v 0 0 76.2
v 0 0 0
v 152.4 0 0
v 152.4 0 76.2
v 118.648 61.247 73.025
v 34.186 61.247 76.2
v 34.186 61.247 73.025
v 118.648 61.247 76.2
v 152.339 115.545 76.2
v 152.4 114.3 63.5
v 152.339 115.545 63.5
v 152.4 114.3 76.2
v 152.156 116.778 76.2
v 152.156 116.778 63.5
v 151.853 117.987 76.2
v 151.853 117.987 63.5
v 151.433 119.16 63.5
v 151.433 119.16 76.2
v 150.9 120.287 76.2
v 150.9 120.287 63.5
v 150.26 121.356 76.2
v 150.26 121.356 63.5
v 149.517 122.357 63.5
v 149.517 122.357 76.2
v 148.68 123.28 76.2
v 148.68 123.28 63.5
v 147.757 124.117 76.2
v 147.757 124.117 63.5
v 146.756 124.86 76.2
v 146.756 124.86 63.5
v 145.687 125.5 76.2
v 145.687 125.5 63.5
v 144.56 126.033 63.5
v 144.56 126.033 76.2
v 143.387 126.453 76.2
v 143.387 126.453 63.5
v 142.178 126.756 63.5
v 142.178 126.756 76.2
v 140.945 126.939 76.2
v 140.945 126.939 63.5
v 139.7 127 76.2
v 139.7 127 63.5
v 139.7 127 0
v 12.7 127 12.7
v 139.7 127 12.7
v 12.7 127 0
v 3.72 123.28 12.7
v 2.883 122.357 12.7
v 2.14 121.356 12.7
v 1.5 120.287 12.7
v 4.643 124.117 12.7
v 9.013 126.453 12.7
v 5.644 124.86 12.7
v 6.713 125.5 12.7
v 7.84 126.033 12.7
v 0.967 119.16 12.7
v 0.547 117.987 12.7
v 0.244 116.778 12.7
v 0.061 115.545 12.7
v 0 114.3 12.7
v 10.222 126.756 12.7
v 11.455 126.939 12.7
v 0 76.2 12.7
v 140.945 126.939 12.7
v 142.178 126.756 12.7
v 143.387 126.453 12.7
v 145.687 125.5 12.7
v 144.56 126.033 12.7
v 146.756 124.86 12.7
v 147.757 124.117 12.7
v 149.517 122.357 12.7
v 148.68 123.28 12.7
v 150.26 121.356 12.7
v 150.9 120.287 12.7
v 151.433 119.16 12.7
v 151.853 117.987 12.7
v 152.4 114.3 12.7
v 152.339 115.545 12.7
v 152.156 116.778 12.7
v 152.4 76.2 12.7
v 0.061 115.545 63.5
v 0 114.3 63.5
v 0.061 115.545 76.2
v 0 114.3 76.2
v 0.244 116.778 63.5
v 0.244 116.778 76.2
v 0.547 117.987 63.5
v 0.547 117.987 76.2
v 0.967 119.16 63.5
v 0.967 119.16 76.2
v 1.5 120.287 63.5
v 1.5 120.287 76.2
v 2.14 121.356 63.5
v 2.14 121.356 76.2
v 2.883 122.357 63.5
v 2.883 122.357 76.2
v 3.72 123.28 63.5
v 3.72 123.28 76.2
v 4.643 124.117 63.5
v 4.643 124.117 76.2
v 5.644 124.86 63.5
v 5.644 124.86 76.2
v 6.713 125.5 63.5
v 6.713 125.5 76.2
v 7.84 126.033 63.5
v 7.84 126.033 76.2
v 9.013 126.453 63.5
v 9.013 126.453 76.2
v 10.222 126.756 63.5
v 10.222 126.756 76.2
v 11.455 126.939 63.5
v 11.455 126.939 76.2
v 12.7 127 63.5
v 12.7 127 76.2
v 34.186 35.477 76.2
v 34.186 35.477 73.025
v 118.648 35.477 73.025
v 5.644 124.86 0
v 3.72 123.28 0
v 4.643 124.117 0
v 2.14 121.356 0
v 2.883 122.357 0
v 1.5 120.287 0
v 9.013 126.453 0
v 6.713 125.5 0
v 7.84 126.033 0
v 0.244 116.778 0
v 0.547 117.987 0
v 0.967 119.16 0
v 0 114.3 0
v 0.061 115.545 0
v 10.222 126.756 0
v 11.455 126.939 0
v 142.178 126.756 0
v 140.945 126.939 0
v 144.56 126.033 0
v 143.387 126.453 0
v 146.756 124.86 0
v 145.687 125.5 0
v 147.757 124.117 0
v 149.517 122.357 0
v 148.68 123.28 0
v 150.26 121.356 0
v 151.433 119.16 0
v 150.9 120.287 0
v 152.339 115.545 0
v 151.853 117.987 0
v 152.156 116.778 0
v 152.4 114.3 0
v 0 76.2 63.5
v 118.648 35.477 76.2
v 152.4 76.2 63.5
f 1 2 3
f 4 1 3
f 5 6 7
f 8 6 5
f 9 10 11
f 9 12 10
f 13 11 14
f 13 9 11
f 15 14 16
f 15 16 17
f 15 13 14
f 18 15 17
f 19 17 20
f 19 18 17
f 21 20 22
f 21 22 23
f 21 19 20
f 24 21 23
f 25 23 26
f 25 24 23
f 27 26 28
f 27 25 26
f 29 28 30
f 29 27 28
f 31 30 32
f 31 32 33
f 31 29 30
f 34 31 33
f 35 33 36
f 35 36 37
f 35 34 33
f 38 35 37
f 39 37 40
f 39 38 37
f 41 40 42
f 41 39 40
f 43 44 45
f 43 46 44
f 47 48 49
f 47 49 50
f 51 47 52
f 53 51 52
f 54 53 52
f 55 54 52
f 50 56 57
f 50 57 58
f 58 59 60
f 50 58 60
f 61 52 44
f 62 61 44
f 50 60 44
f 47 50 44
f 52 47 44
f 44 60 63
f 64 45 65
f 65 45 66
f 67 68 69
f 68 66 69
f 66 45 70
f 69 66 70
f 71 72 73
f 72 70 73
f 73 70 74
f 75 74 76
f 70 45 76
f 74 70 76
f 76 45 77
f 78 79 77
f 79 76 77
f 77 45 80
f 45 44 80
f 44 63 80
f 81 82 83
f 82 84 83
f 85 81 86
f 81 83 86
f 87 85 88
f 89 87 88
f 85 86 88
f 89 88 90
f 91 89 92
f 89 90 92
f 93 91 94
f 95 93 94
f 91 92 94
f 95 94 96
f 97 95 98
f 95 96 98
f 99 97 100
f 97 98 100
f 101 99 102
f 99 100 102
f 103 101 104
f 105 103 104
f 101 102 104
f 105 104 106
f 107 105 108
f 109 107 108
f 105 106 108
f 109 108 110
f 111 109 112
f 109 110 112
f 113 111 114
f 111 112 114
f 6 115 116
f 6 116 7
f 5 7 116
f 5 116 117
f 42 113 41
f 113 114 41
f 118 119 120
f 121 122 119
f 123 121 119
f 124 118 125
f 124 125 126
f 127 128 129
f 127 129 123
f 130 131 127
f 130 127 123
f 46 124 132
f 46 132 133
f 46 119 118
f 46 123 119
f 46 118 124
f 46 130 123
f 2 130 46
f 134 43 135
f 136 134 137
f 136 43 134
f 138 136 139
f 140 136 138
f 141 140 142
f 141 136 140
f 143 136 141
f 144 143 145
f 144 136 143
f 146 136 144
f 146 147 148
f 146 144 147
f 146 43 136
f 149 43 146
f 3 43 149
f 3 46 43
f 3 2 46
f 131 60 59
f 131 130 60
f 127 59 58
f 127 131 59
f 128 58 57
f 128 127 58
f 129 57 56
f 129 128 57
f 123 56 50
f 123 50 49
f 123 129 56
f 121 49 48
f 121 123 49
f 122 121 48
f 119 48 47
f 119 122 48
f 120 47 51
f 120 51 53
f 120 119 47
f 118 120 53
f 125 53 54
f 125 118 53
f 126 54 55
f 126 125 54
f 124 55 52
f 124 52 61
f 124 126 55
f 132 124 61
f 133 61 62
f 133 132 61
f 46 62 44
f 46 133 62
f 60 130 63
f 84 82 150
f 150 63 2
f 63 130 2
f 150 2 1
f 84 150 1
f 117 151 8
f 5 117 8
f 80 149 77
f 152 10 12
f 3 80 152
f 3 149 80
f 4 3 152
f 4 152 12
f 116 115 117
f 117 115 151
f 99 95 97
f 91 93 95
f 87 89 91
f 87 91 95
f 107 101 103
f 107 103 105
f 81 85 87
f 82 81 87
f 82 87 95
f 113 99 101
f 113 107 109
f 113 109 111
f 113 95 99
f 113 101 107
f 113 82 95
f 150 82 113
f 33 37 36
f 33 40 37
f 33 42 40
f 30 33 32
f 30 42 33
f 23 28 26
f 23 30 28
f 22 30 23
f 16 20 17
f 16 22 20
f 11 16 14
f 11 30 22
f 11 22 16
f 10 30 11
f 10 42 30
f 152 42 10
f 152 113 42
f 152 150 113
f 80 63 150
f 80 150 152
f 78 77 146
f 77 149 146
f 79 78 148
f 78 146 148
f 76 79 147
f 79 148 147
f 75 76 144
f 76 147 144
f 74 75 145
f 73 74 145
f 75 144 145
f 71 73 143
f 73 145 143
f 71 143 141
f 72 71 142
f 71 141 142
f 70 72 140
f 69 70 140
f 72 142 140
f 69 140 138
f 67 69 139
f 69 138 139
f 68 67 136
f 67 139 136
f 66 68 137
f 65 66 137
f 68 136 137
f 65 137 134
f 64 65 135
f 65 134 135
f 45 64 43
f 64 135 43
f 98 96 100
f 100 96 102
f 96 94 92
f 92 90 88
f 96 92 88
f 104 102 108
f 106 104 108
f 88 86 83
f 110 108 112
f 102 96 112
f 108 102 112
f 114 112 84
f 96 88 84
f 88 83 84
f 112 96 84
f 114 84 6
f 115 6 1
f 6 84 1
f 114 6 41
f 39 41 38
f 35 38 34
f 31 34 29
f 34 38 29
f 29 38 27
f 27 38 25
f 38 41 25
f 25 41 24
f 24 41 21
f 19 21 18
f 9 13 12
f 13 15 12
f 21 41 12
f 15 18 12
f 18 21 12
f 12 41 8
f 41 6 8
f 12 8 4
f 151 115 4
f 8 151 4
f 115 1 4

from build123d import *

# Parameters (mm, degrees)
SKETCH1_W           = 152.4
SKETCH1_H           = 76.2
BOSS_EXTRUDE1_DEPTH = 76.2
SKETCH2_W           = 152.4
SKETCH2_H           = 12.7
BOSS_EXTRUDE2_DEPTH = 50.8
FILLET1_R           = 12.7
SKETCH3_W           = 84.462045133
SKETCH3_H           = 25.769420555
CUT_EXTRUDE1_DEPTH  = 3.175


with BuildPart() as part:
    # Sketch1 → Boss-Extrude1 (new body)
    with BuildSketch(Plane.XY):
        with Locations((76.2, 38.1)):
            Rectangle(SKETCH1_W, SKETCH1_H)
    extrude(amount=BOSS_EXTRUDE1_DEPTH)

    # Sketch2 → Boss-Extrude2 (add)
    with BuildSketch(Plane(origin=(0, 76.2, 0), x_dir=(1, 0, 0), z_dir=(0, 1, 0))):
        with Locations((76.2, -6.35)):
            Rectangle(SKETCH2_W, SKETCH2_H)
    boss_extrude2 = extrude(amount=BOSS_EXTRUDE2_DEPTH)

    # Mirror1: Boss-Extrude2 across plane
    add(boss_extrude2.mirror(Plane.XY.offset(38.1)))

    # Fillet1
    fillet1_edges = [part.edges().sort_by_distance(p)[0] for p in [
        (0, 127, 6.35),
        (152.4, 127, 6.35),
        (0, 127, 69.85),
        (152.4, 127, 69.85),
    ]]
    fillet(fillet1_edges, radius=FILLET1_R)

    # Sketch3 → Cut-Extrude1 (cut)
    with BuildSketch(Plane.XY.offset(76.2)):
        with Locations((76.416893198, 48.36205359)):
            Rectangle(SKETCH3_W, SKETCH3_H)
    extrude(amount=-CUT_EXTRUDE1_DEPTH, mode=Mode.SUBTRACT)


solid = part.part
